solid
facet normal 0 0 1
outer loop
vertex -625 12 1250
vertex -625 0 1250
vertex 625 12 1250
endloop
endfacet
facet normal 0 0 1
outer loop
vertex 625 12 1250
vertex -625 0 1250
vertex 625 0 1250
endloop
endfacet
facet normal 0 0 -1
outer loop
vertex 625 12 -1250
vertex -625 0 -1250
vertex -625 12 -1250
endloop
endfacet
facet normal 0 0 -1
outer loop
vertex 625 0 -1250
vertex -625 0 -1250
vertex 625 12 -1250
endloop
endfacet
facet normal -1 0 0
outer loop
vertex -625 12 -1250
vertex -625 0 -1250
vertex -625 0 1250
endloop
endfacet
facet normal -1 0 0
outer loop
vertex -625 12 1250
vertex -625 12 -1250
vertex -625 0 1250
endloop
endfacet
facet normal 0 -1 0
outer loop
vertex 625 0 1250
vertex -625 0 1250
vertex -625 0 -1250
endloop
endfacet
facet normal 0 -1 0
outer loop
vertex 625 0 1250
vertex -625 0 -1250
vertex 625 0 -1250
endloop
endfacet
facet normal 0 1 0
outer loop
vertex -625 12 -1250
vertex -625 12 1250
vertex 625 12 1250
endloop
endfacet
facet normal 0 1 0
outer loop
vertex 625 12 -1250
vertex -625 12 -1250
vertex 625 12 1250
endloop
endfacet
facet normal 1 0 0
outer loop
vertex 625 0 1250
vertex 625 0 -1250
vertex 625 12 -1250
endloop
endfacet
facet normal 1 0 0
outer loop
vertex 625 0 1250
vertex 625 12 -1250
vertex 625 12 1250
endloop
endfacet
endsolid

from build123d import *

# Parameters (mm, degrees)
F7_W     = 1250
F7_H     = 2500
F1_DEPTH = 12
F8_W     = 1150
F8_H     = 2400
F2_DEPTH = 200
F3_W     = 1250
F3_H     = 2500
F4_DEPTH = 12


with BuildPart() as f1:
    # F7 (on Front) → F1 (new body)
    with BuildSketch(Plane.XZ):
        Rectangle(F7_W, F7_H)
    extrude(amount=-F1_DEPTH)


with BuildPart() as f2:
    # F8 (on face) → F2 (new body)
    with BuildSketch(Plane.XZ):
        Rectangle(F8_W, F8_H)
    extrude(amount=F2_DEPTH)


with BuildPart() as f4:
    # F3 (on face) → F4 (new body)
    with BuildSketch(Plane.XZ.offset(200)):
        Rectangle(F3_W, F3_H)
    extrude(amount=F4_DEPTH)


solid = f1.part
